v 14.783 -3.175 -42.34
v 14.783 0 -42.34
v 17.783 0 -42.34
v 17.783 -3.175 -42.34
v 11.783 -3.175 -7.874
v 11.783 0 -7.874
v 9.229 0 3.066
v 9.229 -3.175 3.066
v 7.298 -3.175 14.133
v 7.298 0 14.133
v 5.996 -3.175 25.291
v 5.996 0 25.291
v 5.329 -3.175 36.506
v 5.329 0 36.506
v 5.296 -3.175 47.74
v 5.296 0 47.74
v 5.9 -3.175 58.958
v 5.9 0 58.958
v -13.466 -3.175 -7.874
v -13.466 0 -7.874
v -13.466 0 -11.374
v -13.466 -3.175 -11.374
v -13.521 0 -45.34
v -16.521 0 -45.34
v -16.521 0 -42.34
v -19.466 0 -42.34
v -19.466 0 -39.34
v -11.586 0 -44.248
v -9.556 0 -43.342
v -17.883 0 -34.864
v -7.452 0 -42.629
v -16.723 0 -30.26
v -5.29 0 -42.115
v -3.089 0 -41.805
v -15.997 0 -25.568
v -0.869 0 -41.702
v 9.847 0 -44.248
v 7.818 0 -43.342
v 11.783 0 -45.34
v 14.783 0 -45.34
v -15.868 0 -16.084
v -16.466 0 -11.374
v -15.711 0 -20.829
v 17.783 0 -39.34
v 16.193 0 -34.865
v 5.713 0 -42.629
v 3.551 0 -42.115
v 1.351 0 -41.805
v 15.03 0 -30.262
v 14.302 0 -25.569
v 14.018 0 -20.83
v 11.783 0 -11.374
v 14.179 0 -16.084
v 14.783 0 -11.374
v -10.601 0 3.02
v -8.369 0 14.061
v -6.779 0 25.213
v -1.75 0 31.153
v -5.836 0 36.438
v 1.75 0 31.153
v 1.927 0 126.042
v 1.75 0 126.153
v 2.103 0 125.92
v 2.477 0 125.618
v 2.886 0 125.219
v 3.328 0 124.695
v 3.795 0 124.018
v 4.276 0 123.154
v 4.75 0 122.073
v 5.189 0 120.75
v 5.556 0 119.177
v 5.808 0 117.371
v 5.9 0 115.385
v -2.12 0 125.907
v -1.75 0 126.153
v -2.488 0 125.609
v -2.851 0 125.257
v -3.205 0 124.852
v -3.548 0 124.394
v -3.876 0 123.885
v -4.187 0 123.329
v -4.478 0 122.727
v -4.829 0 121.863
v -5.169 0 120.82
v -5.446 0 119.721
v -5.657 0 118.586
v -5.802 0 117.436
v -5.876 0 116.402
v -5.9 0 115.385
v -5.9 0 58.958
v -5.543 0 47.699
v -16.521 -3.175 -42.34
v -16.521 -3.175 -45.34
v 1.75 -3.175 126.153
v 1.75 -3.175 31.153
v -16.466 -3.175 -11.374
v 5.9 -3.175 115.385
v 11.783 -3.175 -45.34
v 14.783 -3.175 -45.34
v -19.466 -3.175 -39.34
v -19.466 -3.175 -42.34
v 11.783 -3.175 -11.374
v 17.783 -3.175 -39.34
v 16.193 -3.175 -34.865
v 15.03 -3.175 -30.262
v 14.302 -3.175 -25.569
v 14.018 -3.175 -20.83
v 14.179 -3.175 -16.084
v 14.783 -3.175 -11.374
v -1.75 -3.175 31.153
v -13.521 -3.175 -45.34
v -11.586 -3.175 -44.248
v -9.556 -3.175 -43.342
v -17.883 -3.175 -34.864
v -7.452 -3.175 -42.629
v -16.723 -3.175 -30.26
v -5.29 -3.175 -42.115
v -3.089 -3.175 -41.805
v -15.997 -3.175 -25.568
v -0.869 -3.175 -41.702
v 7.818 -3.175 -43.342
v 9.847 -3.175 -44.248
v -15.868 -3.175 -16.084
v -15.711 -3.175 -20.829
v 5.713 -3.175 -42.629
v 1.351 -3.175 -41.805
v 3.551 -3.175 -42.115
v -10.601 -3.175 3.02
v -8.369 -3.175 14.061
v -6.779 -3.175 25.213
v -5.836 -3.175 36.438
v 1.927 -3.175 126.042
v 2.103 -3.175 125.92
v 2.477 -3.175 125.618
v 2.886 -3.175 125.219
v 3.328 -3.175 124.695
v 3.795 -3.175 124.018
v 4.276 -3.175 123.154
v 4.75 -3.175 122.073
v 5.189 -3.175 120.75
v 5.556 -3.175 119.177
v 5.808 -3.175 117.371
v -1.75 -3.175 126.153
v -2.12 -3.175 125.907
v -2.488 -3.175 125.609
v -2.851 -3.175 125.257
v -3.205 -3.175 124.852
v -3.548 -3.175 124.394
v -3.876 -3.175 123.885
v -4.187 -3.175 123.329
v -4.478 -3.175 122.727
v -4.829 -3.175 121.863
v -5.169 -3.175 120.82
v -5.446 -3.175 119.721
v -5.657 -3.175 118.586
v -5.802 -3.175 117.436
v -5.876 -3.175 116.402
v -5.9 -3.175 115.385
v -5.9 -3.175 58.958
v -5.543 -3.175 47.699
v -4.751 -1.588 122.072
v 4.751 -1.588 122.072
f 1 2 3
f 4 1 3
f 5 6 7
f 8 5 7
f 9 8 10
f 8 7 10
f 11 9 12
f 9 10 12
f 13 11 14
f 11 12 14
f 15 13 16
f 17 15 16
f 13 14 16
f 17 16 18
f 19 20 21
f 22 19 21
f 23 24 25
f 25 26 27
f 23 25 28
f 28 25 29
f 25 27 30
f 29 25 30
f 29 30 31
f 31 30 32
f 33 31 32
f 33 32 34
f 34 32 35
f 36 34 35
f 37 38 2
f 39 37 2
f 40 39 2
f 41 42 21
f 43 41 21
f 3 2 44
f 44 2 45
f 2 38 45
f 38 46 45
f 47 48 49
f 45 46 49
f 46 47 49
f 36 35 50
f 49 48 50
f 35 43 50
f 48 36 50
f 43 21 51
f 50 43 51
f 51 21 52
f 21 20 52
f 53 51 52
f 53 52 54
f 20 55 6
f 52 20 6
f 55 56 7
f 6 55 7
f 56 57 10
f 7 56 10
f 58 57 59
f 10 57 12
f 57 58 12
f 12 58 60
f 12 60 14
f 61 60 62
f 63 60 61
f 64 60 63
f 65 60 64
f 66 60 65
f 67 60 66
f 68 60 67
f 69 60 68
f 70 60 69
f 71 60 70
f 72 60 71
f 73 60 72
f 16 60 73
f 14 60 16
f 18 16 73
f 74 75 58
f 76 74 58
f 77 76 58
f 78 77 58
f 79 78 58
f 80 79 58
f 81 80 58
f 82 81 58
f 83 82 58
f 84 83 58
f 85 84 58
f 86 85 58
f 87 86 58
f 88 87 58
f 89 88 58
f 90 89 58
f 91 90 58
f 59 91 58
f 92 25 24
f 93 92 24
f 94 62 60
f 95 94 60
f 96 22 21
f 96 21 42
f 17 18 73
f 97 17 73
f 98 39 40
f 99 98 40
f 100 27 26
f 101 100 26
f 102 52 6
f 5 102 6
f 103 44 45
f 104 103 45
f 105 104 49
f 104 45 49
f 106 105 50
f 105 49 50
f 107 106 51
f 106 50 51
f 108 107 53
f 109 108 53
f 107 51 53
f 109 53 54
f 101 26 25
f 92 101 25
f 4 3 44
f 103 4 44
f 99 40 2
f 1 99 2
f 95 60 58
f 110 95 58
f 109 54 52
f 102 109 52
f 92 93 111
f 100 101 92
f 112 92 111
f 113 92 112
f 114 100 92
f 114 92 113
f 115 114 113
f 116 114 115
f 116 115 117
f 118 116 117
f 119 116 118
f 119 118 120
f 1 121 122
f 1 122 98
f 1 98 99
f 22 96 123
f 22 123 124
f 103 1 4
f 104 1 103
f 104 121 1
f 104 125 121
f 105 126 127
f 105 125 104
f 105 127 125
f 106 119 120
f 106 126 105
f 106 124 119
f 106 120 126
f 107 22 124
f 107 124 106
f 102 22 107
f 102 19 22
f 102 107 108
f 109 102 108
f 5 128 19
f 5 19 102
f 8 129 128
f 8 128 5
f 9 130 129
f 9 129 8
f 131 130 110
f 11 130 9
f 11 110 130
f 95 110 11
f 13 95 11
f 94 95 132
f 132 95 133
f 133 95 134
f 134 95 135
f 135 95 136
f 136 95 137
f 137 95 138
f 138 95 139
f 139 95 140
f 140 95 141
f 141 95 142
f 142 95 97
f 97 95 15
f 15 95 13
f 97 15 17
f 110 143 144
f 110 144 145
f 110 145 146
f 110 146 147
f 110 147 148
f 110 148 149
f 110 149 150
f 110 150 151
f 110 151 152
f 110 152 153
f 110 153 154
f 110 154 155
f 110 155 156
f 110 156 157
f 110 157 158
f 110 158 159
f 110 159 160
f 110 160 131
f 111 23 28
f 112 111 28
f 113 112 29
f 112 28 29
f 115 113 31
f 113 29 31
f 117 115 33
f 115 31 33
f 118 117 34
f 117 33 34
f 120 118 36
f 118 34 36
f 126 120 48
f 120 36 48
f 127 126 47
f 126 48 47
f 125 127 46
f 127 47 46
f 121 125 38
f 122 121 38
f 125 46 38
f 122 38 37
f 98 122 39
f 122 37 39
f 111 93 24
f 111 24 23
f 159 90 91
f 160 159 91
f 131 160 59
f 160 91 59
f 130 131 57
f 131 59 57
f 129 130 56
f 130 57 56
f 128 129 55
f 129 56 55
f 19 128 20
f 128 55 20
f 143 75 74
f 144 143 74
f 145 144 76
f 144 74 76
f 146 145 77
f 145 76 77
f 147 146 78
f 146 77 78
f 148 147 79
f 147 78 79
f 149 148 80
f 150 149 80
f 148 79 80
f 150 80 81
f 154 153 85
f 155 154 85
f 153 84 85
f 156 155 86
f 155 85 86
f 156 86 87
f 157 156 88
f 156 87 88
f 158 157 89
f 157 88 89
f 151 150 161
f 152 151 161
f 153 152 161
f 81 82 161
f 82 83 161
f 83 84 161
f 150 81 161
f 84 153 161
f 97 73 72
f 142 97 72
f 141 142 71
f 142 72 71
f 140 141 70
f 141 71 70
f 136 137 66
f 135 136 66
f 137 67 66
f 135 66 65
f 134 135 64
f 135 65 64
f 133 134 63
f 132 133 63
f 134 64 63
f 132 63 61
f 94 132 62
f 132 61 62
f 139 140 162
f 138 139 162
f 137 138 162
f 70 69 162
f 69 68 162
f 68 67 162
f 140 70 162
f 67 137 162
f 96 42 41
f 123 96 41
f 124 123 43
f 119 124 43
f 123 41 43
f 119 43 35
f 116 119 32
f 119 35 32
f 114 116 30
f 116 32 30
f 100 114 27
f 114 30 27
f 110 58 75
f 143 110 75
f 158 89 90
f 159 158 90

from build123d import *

# Parameters (mm, degrees)
F1_DEPTH = 3.175


# Not quite as in the source:
# - a length typed as a fraction of an inch, garbled in the dataset ("3 / 203.2 mm" for 3/8 in), is restored


with BuildPart() as f1:
    # F0 (on Front) → F1 (new body)
    with BuildSketch(Plane.XZ):
        with BuildLine():
            add(Edge.make_bspline(
                [(-1.75, 126.1528220874), (-5.9, 123.6896499738), (-5.9, 115.3852411336)],
                knots=[3.4427337756, 3.4427337756, 3.4427337756, 4.7123889804, 4.7123889804, 4.7123889804], degree=2, weights=[1, 0.8051739469, 1]))
            Line((-5.9, 115.3852411336), (-1.75, 115.3852411336))
            Line((-1.75, 115.3852411336), (-1.75, 126.1528220874))
        make_face()
        with BuildLine():
            add(Edge.make_bspline(
                [(-5.9, 115.3852411336), (-5.9, 107.0808322935), (-1.75, 104.6176601799)],
                knots=[4.7123889804, 4.7123889804, 4.7123889804, 5.9820441852, 5.9820441852, 5.9820441852], degree=2, weights=[1, 0.8051739469, 1]))
            Line((-5.9, 115.3852411336), (-5.9, 79.8345449512))
            Line((-5.9, 79.8345449512), (-5.9, 58.9576361328))
            ThreePointArc((-5.9, 58.9576361328), (-6.7793812573, 25.2130721087), (-13.4661033603, -7.8740350493))
            Line((-13.4661033603, -7.8740350493), (11.7832735849, -7.8740350493))
            ThreePointArc((11.7832735849, -7.8740350493), (5.9964918029, 25.2913389557), (5.9, 58.9576361328))
            Line((5.9, 58.9576361328), (5.9, 79.8345449512))
            Line((5.9, 79.8345449512), (5.9, 115.3852411336))
            add(Edge.make_bspline(
                [(1.75, 104.6176601799), (5.9, 107.0808322935), (5.9, 115.3852411336)],
                knots=[0.301141122, 0.301141122, 0.301141122, 1.5707963268, 1.5707963268, 1.5707963268], degree=2, weights=[1, 0.8051739469, 1]))
            Line((1.75, 104.6176601799), (1.75, 31.1528220874))
            Line((1.75, 31.1528220874), (-1.75, 31.1528220874))
            Line((-1.75, 31.1528220874), (-1.75, 104.6176601799))
        make_face()
        with BuildLine():
            Line((-1.75, 115.3852411336), (-5.9, 115.3852411336))
            add(Edge.make_bspline(
                [(-5.9, 115.3852411336), (-5.9, 107.0808322935), (-1.75, 104.6176601799)],
                knots=[4.7123889804, 4.7123889804, 4.7123889804, 5.9820441852, 5.9820441852, 5.9820441852], degree=2, weights=[1, 0.8051739469, 1]))
            Line((-1.75, 104.6176601799), (-1.75, 115.3852411336))
        make_face()
        with BuildLine():
            Line((1.75, 126.1528220874), (1.75, 115.3852411336))
            Line((1.75, 115.3852411336), (5.9, 115.3852411336))
            add(Edge.make_bspline(
                [(5.9, 115.3852411336), (5.9, 123.6896499738), (1.75, 126.1528220874)],
                knots=[1.5707963268, 1.5707963268, 1.5707963268, 2.8404515316, 2.8404515316, 2.8404515316], degree=2, weights=[1, 0.8051739469, 1]))
        make_face()
        with BuildLine():
            Line((5.9, 115.3852411336), (1.75, 115.3852411336))
            Line((1.75, 115.3852411336), (1.75, 104.6176601799))
            add(Edge.make_bspline(
                [(1.75, 104.6176601799), (5.9, 107.0808322935), (5.9, 115.3852411336)],
                knots=[0.301141122, 0.301141122, 0.301141122, 1.5707963268, 1.5707963268, 1.5707963268], degree=2, weights=[1, 0.8051739469, 1]))
        make_face()
        with BuildLine():
            Line((11.7832735849, -7.8740350493), (-13.4661033603, -7.8740350493))
            Line((-13.4661033603, -7.8740350493), (-13.4661033603, -11.3740350493))
            Line((-13.4661033603, -11.3740350493), (-16.4661033603, -11.3740350493))
            ThreePointArc((-16.4661033603, -11.3740350493), (-15.9973063906, -25.5681128526), (-19.4661033603, -39.3397889622))
            Line((-19.4661033603, -39.3397889622), (-19.4661033603, -42.3397889622))
            Line((-19.4661033603, -42.3397889622), (-16.5214760231, -42.3397889622))
            Line((-16.5214760231, -42.3397889622), (-16.5214760231, -45.3397889622))
            Line((-16.5214760231, -45.3397889622), (-13.5214760231, -45.3397889622))
            ThreePointArc((-13.5214760231, -45.3397889622), (-0.8691012191, -41.7016149524), (11.7832735849, -45.3397889622))
            Line((11.7832735849, -45.3397889622), (14.7832735849, -45.3397889622))
            Line((14.7832735849, -45.3397889622), (14.7832735849, -42.3397889622))
            Line((14.7832735849, -42.3397889622), (17.7832735849, -42.3397889622))
            Line((17.7832735849, -42.3397889622), (17.7832735849, -39.3397889622))
            ThreePointArc((17.7832735849, -39.3397889622), (14.302318759, -25.5694170752), (14.7832735849, -11.3740350493))
            Line((14.7832735849, -11.3740350493), (11.7832735849, -11.3740350493))
            Line((11.7832735849, -11.3740350493), (11.7832735849, -7.8740350493))
        make_face()
    extrude(amount=F1_DEPTH)


solid = f1.part
